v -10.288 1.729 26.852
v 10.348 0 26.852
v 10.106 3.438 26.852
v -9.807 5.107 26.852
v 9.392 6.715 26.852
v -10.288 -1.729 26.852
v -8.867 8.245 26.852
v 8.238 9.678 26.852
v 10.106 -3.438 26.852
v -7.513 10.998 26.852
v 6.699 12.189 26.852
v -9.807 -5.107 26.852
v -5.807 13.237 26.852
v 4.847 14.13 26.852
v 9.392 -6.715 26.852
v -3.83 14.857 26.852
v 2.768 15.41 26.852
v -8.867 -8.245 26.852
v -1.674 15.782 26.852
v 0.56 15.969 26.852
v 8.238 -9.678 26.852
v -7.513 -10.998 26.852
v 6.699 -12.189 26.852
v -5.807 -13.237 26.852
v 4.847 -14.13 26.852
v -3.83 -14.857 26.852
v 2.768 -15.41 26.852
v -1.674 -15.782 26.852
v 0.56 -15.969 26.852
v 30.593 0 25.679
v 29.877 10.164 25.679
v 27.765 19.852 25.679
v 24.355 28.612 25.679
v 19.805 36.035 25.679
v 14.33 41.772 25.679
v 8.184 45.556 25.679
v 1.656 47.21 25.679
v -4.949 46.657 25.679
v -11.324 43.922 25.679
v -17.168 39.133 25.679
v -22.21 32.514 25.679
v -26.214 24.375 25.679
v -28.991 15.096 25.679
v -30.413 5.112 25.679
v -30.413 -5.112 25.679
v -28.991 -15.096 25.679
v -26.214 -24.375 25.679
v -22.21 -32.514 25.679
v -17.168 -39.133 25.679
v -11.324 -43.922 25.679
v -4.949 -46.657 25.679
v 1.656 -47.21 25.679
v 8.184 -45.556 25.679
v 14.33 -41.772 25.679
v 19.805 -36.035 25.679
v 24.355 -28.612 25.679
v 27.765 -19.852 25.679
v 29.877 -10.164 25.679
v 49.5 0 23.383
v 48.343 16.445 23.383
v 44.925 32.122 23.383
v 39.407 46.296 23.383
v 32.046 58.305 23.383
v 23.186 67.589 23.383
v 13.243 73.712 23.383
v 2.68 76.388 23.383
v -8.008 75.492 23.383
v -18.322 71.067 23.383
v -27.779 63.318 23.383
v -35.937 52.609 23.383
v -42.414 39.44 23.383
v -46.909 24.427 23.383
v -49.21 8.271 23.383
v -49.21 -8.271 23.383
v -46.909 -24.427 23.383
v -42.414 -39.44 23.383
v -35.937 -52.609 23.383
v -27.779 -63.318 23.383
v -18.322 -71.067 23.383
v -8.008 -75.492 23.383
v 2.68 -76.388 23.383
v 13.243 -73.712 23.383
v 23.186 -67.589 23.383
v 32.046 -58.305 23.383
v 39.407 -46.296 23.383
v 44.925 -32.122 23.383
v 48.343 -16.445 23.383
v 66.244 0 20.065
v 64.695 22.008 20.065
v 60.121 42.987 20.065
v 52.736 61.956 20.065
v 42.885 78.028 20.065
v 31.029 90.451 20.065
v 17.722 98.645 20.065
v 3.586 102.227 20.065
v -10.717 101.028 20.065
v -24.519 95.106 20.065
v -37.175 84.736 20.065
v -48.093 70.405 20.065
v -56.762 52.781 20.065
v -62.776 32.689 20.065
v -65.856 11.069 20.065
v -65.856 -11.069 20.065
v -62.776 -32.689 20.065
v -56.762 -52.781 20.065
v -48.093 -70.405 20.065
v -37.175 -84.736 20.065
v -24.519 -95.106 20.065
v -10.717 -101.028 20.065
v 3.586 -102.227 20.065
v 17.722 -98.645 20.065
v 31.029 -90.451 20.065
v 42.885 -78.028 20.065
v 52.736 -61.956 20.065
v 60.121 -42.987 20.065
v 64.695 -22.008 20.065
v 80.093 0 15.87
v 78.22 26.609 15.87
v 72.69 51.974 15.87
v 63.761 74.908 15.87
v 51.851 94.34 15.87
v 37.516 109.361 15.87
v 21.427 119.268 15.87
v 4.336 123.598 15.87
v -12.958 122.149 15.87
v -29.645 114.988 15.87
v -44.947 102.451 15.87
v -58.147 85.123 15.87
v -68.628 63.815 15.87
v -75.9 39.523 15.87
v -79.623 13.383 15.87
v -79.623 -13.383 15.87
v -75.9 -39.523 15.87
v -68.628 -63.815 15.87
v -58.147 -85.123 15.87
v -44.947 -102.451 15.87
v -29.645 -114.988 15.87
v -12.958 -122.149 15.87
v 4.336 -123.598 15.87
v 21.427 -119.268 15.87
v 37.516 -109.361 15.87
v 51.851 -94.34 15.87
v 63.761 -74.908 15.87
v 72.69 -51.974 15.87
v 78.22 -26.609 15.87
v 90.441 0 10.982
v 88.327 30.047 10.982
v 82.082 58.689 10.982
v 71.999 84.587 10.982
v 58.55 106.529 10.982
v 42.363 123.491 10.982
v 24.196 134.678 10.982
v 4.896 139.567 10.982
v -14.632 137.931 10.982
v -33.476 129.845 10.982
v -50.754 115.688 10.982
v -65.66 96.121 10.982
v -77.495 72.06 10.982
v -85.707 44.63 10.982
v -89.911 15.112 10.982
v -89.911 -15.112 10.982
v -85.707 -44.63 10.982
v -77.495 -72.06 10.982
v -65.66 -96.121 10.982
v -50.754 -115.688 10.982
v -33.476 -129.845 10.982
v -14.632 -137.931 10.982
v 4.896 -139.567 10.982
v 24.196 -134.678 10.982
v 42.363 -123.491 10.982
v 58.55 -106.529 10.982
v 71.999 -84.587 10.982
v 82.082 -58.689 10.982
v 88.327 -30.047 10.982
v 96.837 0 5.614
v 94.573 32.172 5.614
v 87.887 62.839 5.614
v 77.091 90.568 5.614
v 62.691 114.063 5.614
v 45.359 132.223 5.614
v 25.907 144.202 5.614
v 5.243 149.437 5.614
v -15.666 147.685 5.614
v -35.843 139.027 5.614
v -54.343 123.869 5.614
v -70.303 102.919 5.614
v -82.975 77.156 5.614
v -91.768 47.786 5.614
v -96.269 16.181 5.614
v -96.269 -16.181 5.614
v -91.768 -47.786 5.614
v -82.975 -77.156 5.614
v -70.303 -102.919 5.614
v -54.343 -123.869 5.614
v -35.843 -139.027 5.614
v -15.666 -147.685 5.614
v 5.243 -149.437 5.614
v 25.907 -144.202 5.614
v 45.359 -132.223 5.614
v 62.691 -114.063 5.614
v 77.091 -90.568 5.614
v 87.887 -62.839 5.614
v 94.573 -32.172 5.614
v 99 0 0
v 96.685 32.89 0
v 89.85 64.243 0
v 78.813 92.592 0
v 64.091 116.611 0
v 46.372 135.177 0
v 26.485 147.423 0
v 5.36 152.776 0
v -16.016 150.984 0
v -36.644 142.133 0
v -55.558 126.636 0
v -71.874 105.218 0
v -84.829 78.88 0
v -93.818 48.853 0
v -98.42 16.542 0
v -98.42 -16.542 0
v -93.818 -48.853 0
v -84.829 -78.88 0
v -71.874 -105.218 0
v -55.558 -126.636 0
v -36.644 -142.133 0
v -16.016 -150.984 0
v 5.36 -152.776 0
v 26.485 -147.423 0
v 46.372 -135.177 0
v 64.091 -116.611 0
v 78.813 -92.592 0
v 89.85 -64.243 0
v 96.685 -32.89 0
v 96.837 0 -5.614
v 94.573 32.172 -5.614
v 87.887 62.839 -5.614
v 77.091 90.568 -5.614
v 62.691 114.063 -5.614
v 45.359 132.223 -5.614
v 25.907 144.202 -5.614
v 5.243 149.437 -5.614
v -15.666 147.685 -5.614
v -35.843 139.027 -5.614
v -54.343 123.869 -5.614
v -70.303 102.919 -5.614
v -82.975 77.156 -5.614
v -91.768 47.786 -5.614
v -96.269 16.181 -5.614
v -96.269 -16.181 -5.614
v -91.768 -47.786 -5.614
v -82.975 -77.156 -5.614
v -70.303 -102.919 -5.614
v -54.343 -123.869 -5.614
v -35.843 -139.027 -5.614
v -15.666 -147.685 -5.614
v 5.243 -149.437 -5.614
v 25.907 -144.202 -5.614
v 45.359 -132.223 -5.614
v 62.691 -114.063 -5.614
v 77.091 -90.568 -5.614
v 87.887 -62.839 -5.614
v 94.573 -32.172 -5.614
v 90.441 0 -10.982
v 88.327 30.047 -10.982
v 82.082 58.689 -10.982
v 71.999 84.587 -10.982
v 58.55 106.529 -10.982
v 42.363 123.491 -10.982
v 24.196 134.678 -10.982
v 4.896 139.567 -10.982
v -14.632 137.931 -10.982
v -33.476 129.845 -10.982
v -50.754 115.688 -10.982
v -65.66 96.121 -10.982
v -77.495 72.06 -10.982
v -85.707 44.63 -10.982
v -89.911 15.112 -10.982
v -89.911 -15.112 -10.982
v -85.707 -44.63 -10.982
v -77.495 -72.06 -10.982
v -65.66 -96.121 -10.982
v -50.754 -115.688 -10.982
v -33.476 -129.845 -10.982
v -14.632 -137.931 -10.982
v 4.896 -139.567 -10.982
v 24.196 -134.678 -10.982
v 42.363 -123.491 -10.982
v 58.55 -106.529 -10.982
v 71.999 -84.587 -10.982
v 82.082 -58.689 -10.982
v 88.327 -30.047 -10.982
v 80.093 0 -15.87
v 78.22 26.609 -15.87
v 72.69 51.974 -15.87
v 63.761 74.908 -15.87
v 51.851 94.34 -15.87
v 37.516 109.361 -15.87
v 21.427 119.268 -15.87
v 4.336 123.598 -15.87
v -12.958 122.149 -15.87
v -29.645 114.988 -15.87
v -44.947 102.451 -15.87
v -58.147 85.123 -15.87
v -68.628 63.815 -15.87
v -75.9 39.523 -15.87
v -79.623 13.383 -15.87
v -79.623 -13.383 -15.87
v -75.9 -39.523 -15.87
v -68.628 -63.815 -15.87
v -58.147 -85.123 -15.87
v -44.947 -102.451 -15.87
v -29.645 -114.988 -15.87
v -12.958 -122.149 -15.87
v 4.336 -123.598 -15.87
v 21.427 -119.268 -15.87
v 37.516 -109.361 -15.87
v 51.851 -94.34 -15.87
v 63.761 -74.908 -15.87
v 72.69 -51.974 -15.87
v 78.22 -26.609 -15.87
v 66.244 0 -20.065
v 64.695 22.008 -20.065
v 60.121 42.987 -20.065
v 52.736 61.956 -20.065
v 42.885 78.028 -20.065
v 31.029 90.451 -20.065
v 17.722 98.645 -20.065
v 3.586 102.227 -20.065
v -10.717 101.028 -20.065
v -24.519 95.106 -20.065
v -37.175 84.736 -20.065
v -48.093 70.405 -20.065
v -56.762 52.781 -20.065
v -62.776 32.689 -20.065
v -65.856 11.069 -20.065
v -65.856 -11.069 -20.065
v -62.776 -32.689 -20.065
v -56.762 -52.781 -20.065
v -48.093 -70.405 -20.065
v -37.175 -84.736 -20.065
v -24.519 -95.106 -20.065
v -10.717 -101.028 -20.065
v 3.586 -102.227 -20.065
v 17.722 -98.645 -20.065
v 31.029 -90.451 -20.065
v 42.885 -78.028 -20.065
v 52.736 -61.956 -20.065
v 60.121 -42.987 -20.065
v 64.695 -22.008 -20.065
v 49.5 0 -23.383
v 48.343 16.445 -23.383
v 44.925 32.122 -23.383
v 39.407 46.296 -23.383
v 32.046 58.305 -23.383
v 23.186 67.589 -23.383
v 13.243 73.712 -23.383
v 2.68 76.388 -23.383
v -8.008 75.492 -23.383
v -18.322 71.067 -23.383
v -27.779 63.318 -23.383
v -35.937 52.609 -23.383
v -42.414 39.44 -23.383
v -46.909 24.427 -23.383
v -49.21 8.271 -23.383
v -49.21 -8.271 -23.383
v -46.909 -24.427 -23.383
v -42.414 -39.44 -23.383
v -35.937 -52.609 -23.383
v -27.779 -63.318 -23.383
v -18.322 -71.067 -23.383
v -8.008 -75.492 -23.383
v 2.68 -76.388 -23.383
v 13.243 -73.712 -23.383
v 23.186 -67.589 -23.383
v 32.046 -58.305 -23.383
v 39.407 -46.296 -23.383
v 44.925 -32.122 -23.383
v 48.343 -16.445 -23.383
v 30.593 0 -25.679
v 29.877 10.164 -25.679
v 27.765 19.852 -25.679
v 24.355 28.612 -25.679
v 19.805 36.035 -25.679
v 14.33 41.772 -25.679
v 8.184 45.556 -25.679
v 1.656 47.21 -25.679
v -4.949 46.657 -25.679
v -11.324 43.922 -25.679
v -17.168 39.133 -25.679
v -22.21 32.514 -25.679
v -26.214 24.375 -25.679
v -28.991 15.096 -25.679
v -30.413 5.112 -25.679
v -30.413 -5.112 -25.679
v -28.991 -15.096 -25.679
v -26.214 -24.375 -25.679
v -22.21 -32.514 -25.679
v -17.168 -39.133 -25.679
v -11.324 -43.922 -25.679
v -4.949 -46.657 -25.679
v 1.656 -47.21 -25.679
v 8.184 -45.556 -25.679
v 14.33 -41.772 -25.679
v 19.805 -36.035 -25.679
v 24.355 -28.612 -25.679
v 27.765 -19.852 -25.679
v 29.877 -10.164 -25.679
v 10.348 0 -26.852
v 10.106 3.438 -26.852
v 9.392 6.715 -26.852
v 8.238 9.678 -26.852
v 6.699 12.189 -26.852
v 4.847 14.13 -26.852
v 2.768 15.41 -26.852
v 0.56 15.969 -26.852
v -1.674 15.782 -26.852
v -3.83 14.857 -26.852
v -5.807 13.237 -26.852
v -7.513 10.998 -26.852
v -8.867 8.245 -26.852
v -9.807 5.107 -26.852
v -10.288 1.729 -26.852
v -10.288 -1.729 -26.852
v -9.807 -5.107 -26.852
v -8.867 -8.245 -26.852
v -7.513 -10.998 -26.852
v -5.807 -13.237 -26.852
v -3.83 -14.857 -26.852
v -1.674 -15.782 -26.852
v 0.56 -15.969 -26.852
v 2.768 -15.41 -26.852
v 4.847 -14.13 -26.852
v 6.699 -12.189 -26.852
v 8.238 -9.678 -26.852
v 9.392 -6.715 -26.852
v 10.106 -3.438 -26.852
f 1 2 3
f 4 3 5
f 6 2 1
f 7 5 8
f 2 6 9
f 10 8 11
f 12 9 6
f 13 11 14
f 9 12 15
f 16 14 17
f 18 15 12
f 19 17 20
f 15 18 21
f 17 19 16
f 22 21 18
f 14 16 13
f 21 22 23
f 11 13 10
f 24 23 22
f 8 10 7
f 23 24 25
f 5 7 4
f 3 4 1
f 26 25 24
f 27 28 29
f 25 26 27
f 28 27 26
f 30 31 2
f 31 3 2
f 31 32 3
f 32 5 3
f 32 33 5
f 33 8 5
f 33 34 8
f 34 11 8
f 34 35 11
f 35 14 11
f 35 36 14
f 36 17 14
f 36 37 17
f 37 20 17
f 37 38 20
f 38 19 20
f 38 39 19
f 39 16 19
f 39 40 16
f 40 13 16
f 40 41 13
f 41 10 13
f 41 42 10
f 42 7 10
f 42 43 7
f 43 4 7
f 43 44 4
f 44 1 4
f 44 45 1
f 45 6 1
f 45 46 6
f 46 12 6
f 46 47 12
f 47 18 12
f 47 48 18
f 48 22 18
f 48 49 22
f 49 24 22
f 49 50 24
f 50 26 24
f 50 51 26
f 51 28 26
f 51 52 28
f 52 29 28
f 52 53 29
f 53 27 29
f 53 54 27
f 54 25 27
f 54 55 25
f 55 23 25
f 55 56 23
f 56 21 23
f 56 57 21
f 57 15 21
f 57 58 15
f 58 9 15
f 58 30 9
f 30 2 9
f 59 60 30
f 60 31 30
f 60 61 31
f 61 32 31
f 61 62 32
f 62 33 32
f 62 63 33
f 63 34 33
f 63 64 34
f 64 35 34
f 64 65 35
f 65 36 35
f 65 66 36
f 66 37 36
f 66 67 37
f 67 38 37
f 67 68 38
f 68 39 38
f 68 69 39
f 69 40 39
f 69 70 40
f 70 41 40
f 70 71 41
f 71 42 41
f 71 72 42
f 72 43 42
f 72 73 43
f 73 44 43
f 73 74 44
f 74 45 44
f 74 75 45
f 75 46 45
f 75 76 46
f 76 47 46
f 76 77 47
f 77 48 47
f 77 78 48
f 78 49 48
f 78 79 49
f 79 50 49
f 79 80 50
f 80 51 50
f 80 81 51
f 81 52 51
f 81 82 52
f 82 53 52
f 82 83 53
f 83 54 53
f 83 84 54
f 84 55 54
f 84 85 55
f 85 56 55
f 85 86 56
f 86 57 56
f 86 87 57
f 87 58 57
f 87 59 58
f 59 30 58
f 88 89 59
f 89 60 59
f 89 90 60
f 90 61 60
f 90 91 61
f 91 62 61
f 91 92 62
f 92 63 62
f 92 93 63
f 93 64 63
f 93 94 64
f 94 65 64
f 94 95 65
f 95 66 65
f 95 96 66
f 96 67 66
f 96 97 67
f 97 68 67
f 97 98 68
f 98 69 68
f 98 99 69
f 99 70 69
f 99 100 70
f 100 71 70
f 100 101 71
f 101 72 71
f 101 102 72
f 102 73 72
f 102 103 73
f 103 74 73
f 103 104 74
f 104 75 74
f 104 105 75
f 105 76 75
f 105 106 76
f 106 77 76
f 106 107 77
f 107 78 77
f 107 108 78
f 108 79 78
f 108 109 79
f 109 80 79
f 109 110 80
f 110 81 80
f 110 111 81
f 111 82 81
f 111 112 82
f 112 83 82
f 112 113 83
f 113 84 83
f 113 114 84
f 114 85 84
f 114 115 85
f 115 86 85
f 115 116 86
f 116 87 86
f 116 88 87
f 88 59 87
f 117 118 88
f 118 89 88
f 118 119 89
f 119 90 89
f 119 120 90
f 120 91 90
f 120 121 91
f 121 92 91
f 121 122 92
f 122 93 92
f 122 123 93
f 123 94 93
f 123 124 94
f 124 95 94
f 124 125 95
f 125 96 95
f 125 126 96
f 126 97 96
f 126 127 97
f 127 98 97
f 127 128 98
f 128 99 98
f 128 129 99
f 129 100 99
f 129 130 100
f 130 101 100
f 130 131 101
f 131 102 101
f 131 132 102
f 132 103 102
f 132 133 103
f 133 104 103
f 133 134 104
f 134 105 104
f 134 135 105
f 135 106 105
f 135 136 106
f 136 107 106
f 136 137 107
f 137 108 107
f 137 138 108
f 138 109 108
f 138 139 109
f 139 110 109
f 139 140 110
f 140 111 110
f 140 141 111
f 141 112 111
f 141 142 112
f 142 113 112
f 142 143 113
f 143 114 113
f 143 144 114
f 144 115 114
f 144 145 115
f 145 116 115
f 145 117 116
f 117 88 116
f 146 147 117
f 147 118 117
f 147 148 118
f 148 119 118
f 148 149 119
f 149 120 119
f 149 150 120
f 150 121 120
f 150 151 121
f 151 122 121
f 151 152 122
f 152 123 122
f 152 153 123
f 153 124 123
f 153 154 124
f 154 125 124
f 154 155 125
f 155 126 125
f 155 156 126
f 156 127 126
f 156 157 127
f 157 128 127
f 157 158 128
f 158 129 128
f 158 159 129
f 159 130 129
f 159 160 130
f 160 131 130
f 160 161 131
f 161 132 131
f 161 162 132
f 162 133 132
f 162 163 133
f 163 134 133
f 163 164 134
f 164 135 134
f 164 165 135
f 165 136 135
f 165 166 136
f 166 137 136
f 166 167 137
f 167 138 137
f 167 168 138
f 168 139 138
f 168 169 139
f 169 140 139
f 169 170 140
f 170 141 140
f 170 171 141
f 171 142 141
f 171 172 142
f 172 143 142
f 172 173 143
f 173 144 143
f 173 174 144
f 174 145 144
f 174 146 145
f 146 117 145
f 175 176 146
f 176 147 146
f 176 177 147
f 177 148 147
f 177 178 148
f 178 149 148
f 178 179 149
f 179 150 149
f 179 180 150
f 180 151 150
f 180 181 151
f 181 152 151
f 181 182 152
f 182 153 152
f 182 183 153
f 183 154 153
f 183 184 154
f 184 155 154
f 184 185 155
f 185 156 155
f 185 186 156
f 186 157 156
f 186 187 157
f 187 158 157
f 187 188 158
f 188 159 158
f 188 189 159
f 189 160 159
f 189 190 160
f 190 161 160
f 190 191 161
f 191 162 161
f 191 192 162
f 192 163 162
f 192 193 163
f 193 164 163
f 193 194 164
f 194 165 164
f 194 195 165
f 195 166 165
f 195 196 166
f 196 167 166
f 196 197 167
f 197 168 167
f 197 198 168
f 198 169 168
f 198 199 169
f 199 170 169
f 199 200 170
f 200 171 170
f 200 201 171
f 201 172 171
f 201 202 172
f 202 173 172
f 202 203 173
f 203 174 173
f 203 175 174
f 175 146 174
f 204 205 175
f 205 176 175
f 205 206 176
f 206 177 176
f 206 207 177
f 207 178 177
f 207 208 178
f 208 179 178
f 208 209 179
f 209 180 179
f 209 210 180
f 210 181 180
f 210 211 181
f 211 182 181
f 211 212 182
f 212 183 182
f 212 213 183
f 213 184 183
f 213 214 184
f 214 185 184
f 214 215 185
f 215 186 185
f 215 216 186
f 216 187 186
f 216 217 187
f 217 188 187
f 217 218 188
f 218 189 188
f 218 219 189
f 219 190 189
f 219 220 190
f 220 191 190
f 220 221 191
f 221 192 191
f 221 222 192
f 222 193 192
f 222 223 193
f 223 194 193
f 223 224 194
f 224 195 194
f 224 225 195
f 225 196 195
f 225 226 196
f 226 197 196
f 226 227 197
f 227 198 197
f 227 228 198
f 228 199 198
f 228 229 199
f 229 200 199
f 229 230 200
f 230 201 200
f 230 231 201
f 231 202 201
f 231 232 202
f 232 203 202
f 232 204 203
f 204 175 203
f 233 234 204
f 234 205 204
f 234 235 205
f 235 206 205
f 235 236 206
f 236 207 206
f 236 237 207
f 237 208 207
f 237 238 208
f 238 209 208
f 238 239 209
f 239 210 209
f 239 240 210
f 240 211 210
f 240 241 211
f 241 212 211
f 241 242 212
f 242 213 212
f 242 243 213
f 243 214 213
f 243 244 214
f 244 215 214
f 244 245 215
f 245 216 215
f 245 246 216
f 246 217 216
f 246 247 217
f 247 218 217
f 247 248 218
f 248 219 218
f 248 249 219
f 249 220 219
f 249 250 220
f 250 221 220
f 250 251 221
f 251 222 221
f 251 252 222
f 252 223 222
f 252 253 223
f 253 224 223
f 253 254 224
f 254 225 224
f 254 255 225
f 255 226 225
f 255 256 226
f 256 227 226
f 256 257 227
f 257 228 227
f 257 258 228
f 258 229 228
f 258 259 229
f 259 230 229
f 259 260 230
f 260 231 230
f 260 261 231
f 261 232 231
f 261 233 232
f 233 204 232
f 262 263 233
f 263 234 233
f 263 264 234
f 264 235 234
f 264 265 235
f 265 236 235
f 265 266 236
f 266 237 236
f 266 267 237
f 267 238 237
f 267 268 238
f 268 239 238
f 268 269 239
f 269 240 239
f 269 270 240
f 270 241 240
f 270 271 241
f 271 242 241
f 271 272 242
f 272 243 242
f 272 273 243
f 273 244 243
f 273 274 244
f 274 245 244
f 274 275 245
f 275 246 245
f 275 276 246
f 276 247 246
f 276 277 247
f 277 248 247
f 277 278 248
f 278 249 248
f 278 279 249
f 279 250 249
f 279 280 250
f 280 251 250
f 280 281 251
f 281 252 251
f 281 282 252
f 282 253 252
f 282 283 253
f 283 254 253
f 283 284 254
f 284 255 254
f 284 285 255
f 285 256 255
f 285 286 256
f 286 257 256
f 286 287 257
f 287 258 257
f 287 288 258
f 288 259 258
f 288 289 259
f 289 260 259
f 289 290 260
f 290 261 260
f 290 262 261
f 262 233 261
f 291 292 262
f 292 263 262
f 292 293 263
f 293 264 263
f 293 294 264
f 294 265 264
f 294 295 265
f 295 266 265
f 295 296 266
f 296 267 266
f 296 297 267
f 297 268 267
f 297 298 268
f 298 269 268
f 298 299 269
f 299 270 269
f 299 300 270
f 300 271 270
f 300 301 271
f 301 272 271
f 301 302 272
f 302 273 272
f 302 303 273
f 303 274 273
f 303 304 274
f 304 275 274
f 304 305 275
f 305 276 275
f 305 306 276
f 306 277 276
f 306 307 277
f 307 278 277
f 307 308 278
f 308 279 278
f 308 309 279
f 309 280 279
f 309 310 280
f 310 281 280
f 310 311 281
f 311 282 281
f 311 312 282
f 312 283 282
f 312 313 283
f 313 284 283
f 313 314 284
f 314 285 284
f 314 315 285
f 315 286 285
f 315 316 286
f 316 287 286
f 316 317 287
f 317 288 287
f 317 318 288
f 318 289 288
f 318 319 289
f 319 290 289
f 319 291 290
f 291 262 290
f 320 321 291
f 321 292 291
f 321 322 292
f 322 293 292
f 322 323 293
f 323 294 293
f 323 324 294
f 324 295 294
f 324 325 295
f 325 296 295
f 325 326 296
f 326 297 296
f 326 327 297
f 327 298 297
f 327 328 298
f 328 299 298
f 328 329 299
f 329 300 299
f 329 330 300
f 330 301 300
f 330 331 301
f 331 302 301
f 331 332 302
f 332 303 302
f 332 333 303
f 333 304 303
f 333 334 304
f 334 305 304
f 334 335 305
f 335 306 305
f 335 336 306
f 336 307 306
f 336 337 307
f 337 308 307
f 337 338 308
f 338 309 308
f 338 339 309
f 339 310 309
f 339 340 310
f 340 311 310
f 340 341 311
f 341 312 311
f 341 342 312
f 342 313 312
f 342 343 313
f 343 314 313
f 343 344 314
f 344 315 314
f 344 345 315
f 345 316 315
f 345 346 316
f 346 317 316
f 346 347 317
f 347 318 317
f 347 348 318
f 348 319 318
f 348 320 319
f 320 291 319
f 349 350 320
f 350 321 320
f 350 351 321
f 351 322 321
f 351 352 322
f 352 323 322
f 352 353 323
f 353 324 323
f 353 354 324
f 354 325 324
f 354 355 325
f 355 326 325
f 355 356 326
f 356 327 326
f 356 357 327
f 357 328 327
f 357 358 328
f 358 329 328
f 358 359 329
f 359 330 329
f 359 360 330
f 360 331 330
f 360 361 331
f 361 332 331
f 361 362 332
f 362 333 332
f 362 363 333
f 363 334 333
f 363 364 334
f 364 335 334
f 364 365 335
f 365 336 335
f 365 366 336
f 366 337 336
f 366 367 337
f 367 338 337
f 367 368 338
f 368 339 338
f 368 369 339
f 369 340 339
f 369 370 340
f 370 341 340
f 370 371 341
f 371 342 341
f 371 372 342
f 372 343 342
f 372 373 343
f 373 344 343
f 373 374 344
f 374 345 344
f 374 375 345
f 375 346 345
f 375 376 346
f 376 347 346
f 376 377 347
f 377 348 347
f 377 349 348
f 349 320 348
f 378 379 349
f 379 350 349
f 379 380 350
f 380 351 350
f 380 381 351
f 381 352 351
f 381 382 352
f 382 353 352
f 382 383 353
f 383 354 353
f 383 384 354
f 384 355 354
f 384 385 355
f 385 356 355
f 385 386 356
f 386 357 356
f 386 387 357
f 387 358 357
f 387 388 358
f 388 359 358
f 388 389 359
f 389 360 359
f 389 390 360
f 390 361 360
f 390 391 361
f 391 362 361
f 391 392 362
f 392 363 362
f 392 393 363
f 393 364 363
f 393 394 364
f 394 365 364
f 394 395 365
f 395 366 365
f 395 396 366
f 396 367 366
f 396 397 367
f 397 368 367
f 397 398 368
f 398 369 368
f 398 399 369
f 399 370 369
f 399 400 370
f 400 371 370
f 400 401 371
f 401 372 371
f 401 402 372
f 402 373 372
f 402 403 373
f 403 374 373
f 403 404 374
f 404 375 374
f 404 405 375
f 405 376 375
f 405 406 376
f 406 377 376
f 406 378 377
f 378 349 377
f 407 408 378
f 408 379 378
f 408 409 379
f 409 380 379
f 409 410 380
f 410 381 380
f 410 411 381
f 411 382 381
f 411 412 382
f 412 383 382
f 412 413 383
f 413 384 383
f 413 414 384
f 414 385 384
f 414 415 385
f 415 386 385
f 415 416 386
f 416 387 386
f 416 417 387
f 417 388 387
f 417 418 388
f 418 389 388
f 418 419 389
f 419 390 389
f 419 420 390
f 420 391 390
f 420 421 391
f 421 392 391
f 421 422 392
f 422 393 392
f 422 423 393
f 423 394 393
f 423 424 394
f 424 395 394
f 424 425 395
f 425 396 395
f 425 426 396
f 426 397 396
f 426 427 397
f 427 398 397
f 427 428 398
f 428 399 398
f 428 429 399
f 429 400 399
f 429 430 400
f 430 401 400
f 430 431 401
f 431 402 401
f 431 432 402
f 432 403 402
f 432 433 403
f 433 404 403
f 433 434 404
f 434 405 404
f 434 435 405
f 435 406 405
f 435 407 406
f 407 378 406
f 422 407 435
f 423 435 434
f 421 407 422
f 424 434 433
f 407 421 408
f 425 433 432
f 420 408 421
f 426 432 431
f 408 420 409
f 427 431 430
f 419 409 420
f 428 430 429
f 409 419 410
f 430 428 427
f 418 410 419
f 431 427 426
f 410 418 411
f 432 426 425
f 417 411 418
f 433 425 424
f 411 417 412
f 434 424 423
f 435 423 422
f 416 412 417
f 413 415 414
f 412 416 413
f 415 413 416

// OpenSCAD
// Generated by SolidPython 1.0.1 on 2020-07-29 00:46:50


scale(v = [11, 17, 3]) {
	sphere(r = 9);
}
/***********************************************
*********      SolidPython code:      **********
************************************************
 
# import packages: SolidPython
from solid import *
from solid.utils import *
from itertools import chain, combinations, permutations


class Resize:

    def __init__(self, scad_file):
        self.scad_file = scad_file
        #self.scad_file = import_scad(scad_file)
        # cone/cylinder param:
        self.r1 = 0
        self.r2 = 0
        self.h = 0
        # rectangular prism param:
        self.w = 0
        self.l = 0
        # ellipse param:
        self.r = 0

    # import OpenScad code (file name corresponds to shape)


    # classify shape + parameters
    def assign(self, param1, param2, param3):
        if self.scad_file == 'cone.scad':
            self.r1 = param1
            self.r2 = param2
            self.h = param3
        elif self.scad_file == 'cylinder.scad':
            self.r1 = param1
            self.r2 = param2
            self.h = param3
        elif self.scad_file == 'rectangularPrism.scad':
            self.h = param1
            self.l = param2
            self.w = param3
        else:
            self.r = param1
            self.h = param2

    # resize parameters
    def iterate(self):
        x = range(3, 20, 2)
        i = 1
        if self.scad_file == 'cone.scad':
            tempList = list(permutations(x, 2))
            for temp in tempList:
                param1 = temp[0]
                param2 = temp[1]
                filepath = 'produced_scad_files/' + 'cone' + str(param1) + '_' + str(param2) + '_' + '.scad'
                scad_render_to_file(cylinder(h=param1, r1=param2, r2=0), filepath)

        elif self.scad_file == 'cylinder.scad':
            tempList = list(permutations(x, 3))
            for temp in tempList:
                param1 = temp[0]
                param2 = temp[1]
                filepath = 'produced_scad_files/' + 'cylinder' + str(param1) + '_' + str(param2) + '_' + '.scad'
                scad_render_to_file(cylinder(h=param1, r1=param2, r2=param2), filepath)

        elif self.scad_file == 'rectangularPrism.scad':
            tempList = list(permutations(x, 3))
            for temp in tempList:
                param1 = temp[0]
                param2 = temp[1]
                param3 = temp[2]
                filepath = 'produced_scad_files/' + 'rectangularPrism' + str(param1) + '_' + str(param2) + '_' + str(
                    param3) + '.scad'
                scad_render_to_file(cube(size=(param1, param2, param3)), filepath)

        elif self.scad_file == 'ellipse.scad':
            tempList = list(permutations(x, 4))
            for temp in tempList:
                param1 = temp[0]
                param2 = temp[1]
                param3 = temp[2]
                param4 = temp[3]
                filepath = 'produced_scad_files/' + 'ellipse' + str(param1) + '_' + str(param2) + '_' + str(param3) + '_' + str(param4) + '.scad'
                scad_render_to_file(scale([param1, param2, param3])(sphere(r=param4)), filepath)

    def render_to_scadfile(self):
        scad_render_to_file(scad, 'example.scad') 
 
************************************************/
